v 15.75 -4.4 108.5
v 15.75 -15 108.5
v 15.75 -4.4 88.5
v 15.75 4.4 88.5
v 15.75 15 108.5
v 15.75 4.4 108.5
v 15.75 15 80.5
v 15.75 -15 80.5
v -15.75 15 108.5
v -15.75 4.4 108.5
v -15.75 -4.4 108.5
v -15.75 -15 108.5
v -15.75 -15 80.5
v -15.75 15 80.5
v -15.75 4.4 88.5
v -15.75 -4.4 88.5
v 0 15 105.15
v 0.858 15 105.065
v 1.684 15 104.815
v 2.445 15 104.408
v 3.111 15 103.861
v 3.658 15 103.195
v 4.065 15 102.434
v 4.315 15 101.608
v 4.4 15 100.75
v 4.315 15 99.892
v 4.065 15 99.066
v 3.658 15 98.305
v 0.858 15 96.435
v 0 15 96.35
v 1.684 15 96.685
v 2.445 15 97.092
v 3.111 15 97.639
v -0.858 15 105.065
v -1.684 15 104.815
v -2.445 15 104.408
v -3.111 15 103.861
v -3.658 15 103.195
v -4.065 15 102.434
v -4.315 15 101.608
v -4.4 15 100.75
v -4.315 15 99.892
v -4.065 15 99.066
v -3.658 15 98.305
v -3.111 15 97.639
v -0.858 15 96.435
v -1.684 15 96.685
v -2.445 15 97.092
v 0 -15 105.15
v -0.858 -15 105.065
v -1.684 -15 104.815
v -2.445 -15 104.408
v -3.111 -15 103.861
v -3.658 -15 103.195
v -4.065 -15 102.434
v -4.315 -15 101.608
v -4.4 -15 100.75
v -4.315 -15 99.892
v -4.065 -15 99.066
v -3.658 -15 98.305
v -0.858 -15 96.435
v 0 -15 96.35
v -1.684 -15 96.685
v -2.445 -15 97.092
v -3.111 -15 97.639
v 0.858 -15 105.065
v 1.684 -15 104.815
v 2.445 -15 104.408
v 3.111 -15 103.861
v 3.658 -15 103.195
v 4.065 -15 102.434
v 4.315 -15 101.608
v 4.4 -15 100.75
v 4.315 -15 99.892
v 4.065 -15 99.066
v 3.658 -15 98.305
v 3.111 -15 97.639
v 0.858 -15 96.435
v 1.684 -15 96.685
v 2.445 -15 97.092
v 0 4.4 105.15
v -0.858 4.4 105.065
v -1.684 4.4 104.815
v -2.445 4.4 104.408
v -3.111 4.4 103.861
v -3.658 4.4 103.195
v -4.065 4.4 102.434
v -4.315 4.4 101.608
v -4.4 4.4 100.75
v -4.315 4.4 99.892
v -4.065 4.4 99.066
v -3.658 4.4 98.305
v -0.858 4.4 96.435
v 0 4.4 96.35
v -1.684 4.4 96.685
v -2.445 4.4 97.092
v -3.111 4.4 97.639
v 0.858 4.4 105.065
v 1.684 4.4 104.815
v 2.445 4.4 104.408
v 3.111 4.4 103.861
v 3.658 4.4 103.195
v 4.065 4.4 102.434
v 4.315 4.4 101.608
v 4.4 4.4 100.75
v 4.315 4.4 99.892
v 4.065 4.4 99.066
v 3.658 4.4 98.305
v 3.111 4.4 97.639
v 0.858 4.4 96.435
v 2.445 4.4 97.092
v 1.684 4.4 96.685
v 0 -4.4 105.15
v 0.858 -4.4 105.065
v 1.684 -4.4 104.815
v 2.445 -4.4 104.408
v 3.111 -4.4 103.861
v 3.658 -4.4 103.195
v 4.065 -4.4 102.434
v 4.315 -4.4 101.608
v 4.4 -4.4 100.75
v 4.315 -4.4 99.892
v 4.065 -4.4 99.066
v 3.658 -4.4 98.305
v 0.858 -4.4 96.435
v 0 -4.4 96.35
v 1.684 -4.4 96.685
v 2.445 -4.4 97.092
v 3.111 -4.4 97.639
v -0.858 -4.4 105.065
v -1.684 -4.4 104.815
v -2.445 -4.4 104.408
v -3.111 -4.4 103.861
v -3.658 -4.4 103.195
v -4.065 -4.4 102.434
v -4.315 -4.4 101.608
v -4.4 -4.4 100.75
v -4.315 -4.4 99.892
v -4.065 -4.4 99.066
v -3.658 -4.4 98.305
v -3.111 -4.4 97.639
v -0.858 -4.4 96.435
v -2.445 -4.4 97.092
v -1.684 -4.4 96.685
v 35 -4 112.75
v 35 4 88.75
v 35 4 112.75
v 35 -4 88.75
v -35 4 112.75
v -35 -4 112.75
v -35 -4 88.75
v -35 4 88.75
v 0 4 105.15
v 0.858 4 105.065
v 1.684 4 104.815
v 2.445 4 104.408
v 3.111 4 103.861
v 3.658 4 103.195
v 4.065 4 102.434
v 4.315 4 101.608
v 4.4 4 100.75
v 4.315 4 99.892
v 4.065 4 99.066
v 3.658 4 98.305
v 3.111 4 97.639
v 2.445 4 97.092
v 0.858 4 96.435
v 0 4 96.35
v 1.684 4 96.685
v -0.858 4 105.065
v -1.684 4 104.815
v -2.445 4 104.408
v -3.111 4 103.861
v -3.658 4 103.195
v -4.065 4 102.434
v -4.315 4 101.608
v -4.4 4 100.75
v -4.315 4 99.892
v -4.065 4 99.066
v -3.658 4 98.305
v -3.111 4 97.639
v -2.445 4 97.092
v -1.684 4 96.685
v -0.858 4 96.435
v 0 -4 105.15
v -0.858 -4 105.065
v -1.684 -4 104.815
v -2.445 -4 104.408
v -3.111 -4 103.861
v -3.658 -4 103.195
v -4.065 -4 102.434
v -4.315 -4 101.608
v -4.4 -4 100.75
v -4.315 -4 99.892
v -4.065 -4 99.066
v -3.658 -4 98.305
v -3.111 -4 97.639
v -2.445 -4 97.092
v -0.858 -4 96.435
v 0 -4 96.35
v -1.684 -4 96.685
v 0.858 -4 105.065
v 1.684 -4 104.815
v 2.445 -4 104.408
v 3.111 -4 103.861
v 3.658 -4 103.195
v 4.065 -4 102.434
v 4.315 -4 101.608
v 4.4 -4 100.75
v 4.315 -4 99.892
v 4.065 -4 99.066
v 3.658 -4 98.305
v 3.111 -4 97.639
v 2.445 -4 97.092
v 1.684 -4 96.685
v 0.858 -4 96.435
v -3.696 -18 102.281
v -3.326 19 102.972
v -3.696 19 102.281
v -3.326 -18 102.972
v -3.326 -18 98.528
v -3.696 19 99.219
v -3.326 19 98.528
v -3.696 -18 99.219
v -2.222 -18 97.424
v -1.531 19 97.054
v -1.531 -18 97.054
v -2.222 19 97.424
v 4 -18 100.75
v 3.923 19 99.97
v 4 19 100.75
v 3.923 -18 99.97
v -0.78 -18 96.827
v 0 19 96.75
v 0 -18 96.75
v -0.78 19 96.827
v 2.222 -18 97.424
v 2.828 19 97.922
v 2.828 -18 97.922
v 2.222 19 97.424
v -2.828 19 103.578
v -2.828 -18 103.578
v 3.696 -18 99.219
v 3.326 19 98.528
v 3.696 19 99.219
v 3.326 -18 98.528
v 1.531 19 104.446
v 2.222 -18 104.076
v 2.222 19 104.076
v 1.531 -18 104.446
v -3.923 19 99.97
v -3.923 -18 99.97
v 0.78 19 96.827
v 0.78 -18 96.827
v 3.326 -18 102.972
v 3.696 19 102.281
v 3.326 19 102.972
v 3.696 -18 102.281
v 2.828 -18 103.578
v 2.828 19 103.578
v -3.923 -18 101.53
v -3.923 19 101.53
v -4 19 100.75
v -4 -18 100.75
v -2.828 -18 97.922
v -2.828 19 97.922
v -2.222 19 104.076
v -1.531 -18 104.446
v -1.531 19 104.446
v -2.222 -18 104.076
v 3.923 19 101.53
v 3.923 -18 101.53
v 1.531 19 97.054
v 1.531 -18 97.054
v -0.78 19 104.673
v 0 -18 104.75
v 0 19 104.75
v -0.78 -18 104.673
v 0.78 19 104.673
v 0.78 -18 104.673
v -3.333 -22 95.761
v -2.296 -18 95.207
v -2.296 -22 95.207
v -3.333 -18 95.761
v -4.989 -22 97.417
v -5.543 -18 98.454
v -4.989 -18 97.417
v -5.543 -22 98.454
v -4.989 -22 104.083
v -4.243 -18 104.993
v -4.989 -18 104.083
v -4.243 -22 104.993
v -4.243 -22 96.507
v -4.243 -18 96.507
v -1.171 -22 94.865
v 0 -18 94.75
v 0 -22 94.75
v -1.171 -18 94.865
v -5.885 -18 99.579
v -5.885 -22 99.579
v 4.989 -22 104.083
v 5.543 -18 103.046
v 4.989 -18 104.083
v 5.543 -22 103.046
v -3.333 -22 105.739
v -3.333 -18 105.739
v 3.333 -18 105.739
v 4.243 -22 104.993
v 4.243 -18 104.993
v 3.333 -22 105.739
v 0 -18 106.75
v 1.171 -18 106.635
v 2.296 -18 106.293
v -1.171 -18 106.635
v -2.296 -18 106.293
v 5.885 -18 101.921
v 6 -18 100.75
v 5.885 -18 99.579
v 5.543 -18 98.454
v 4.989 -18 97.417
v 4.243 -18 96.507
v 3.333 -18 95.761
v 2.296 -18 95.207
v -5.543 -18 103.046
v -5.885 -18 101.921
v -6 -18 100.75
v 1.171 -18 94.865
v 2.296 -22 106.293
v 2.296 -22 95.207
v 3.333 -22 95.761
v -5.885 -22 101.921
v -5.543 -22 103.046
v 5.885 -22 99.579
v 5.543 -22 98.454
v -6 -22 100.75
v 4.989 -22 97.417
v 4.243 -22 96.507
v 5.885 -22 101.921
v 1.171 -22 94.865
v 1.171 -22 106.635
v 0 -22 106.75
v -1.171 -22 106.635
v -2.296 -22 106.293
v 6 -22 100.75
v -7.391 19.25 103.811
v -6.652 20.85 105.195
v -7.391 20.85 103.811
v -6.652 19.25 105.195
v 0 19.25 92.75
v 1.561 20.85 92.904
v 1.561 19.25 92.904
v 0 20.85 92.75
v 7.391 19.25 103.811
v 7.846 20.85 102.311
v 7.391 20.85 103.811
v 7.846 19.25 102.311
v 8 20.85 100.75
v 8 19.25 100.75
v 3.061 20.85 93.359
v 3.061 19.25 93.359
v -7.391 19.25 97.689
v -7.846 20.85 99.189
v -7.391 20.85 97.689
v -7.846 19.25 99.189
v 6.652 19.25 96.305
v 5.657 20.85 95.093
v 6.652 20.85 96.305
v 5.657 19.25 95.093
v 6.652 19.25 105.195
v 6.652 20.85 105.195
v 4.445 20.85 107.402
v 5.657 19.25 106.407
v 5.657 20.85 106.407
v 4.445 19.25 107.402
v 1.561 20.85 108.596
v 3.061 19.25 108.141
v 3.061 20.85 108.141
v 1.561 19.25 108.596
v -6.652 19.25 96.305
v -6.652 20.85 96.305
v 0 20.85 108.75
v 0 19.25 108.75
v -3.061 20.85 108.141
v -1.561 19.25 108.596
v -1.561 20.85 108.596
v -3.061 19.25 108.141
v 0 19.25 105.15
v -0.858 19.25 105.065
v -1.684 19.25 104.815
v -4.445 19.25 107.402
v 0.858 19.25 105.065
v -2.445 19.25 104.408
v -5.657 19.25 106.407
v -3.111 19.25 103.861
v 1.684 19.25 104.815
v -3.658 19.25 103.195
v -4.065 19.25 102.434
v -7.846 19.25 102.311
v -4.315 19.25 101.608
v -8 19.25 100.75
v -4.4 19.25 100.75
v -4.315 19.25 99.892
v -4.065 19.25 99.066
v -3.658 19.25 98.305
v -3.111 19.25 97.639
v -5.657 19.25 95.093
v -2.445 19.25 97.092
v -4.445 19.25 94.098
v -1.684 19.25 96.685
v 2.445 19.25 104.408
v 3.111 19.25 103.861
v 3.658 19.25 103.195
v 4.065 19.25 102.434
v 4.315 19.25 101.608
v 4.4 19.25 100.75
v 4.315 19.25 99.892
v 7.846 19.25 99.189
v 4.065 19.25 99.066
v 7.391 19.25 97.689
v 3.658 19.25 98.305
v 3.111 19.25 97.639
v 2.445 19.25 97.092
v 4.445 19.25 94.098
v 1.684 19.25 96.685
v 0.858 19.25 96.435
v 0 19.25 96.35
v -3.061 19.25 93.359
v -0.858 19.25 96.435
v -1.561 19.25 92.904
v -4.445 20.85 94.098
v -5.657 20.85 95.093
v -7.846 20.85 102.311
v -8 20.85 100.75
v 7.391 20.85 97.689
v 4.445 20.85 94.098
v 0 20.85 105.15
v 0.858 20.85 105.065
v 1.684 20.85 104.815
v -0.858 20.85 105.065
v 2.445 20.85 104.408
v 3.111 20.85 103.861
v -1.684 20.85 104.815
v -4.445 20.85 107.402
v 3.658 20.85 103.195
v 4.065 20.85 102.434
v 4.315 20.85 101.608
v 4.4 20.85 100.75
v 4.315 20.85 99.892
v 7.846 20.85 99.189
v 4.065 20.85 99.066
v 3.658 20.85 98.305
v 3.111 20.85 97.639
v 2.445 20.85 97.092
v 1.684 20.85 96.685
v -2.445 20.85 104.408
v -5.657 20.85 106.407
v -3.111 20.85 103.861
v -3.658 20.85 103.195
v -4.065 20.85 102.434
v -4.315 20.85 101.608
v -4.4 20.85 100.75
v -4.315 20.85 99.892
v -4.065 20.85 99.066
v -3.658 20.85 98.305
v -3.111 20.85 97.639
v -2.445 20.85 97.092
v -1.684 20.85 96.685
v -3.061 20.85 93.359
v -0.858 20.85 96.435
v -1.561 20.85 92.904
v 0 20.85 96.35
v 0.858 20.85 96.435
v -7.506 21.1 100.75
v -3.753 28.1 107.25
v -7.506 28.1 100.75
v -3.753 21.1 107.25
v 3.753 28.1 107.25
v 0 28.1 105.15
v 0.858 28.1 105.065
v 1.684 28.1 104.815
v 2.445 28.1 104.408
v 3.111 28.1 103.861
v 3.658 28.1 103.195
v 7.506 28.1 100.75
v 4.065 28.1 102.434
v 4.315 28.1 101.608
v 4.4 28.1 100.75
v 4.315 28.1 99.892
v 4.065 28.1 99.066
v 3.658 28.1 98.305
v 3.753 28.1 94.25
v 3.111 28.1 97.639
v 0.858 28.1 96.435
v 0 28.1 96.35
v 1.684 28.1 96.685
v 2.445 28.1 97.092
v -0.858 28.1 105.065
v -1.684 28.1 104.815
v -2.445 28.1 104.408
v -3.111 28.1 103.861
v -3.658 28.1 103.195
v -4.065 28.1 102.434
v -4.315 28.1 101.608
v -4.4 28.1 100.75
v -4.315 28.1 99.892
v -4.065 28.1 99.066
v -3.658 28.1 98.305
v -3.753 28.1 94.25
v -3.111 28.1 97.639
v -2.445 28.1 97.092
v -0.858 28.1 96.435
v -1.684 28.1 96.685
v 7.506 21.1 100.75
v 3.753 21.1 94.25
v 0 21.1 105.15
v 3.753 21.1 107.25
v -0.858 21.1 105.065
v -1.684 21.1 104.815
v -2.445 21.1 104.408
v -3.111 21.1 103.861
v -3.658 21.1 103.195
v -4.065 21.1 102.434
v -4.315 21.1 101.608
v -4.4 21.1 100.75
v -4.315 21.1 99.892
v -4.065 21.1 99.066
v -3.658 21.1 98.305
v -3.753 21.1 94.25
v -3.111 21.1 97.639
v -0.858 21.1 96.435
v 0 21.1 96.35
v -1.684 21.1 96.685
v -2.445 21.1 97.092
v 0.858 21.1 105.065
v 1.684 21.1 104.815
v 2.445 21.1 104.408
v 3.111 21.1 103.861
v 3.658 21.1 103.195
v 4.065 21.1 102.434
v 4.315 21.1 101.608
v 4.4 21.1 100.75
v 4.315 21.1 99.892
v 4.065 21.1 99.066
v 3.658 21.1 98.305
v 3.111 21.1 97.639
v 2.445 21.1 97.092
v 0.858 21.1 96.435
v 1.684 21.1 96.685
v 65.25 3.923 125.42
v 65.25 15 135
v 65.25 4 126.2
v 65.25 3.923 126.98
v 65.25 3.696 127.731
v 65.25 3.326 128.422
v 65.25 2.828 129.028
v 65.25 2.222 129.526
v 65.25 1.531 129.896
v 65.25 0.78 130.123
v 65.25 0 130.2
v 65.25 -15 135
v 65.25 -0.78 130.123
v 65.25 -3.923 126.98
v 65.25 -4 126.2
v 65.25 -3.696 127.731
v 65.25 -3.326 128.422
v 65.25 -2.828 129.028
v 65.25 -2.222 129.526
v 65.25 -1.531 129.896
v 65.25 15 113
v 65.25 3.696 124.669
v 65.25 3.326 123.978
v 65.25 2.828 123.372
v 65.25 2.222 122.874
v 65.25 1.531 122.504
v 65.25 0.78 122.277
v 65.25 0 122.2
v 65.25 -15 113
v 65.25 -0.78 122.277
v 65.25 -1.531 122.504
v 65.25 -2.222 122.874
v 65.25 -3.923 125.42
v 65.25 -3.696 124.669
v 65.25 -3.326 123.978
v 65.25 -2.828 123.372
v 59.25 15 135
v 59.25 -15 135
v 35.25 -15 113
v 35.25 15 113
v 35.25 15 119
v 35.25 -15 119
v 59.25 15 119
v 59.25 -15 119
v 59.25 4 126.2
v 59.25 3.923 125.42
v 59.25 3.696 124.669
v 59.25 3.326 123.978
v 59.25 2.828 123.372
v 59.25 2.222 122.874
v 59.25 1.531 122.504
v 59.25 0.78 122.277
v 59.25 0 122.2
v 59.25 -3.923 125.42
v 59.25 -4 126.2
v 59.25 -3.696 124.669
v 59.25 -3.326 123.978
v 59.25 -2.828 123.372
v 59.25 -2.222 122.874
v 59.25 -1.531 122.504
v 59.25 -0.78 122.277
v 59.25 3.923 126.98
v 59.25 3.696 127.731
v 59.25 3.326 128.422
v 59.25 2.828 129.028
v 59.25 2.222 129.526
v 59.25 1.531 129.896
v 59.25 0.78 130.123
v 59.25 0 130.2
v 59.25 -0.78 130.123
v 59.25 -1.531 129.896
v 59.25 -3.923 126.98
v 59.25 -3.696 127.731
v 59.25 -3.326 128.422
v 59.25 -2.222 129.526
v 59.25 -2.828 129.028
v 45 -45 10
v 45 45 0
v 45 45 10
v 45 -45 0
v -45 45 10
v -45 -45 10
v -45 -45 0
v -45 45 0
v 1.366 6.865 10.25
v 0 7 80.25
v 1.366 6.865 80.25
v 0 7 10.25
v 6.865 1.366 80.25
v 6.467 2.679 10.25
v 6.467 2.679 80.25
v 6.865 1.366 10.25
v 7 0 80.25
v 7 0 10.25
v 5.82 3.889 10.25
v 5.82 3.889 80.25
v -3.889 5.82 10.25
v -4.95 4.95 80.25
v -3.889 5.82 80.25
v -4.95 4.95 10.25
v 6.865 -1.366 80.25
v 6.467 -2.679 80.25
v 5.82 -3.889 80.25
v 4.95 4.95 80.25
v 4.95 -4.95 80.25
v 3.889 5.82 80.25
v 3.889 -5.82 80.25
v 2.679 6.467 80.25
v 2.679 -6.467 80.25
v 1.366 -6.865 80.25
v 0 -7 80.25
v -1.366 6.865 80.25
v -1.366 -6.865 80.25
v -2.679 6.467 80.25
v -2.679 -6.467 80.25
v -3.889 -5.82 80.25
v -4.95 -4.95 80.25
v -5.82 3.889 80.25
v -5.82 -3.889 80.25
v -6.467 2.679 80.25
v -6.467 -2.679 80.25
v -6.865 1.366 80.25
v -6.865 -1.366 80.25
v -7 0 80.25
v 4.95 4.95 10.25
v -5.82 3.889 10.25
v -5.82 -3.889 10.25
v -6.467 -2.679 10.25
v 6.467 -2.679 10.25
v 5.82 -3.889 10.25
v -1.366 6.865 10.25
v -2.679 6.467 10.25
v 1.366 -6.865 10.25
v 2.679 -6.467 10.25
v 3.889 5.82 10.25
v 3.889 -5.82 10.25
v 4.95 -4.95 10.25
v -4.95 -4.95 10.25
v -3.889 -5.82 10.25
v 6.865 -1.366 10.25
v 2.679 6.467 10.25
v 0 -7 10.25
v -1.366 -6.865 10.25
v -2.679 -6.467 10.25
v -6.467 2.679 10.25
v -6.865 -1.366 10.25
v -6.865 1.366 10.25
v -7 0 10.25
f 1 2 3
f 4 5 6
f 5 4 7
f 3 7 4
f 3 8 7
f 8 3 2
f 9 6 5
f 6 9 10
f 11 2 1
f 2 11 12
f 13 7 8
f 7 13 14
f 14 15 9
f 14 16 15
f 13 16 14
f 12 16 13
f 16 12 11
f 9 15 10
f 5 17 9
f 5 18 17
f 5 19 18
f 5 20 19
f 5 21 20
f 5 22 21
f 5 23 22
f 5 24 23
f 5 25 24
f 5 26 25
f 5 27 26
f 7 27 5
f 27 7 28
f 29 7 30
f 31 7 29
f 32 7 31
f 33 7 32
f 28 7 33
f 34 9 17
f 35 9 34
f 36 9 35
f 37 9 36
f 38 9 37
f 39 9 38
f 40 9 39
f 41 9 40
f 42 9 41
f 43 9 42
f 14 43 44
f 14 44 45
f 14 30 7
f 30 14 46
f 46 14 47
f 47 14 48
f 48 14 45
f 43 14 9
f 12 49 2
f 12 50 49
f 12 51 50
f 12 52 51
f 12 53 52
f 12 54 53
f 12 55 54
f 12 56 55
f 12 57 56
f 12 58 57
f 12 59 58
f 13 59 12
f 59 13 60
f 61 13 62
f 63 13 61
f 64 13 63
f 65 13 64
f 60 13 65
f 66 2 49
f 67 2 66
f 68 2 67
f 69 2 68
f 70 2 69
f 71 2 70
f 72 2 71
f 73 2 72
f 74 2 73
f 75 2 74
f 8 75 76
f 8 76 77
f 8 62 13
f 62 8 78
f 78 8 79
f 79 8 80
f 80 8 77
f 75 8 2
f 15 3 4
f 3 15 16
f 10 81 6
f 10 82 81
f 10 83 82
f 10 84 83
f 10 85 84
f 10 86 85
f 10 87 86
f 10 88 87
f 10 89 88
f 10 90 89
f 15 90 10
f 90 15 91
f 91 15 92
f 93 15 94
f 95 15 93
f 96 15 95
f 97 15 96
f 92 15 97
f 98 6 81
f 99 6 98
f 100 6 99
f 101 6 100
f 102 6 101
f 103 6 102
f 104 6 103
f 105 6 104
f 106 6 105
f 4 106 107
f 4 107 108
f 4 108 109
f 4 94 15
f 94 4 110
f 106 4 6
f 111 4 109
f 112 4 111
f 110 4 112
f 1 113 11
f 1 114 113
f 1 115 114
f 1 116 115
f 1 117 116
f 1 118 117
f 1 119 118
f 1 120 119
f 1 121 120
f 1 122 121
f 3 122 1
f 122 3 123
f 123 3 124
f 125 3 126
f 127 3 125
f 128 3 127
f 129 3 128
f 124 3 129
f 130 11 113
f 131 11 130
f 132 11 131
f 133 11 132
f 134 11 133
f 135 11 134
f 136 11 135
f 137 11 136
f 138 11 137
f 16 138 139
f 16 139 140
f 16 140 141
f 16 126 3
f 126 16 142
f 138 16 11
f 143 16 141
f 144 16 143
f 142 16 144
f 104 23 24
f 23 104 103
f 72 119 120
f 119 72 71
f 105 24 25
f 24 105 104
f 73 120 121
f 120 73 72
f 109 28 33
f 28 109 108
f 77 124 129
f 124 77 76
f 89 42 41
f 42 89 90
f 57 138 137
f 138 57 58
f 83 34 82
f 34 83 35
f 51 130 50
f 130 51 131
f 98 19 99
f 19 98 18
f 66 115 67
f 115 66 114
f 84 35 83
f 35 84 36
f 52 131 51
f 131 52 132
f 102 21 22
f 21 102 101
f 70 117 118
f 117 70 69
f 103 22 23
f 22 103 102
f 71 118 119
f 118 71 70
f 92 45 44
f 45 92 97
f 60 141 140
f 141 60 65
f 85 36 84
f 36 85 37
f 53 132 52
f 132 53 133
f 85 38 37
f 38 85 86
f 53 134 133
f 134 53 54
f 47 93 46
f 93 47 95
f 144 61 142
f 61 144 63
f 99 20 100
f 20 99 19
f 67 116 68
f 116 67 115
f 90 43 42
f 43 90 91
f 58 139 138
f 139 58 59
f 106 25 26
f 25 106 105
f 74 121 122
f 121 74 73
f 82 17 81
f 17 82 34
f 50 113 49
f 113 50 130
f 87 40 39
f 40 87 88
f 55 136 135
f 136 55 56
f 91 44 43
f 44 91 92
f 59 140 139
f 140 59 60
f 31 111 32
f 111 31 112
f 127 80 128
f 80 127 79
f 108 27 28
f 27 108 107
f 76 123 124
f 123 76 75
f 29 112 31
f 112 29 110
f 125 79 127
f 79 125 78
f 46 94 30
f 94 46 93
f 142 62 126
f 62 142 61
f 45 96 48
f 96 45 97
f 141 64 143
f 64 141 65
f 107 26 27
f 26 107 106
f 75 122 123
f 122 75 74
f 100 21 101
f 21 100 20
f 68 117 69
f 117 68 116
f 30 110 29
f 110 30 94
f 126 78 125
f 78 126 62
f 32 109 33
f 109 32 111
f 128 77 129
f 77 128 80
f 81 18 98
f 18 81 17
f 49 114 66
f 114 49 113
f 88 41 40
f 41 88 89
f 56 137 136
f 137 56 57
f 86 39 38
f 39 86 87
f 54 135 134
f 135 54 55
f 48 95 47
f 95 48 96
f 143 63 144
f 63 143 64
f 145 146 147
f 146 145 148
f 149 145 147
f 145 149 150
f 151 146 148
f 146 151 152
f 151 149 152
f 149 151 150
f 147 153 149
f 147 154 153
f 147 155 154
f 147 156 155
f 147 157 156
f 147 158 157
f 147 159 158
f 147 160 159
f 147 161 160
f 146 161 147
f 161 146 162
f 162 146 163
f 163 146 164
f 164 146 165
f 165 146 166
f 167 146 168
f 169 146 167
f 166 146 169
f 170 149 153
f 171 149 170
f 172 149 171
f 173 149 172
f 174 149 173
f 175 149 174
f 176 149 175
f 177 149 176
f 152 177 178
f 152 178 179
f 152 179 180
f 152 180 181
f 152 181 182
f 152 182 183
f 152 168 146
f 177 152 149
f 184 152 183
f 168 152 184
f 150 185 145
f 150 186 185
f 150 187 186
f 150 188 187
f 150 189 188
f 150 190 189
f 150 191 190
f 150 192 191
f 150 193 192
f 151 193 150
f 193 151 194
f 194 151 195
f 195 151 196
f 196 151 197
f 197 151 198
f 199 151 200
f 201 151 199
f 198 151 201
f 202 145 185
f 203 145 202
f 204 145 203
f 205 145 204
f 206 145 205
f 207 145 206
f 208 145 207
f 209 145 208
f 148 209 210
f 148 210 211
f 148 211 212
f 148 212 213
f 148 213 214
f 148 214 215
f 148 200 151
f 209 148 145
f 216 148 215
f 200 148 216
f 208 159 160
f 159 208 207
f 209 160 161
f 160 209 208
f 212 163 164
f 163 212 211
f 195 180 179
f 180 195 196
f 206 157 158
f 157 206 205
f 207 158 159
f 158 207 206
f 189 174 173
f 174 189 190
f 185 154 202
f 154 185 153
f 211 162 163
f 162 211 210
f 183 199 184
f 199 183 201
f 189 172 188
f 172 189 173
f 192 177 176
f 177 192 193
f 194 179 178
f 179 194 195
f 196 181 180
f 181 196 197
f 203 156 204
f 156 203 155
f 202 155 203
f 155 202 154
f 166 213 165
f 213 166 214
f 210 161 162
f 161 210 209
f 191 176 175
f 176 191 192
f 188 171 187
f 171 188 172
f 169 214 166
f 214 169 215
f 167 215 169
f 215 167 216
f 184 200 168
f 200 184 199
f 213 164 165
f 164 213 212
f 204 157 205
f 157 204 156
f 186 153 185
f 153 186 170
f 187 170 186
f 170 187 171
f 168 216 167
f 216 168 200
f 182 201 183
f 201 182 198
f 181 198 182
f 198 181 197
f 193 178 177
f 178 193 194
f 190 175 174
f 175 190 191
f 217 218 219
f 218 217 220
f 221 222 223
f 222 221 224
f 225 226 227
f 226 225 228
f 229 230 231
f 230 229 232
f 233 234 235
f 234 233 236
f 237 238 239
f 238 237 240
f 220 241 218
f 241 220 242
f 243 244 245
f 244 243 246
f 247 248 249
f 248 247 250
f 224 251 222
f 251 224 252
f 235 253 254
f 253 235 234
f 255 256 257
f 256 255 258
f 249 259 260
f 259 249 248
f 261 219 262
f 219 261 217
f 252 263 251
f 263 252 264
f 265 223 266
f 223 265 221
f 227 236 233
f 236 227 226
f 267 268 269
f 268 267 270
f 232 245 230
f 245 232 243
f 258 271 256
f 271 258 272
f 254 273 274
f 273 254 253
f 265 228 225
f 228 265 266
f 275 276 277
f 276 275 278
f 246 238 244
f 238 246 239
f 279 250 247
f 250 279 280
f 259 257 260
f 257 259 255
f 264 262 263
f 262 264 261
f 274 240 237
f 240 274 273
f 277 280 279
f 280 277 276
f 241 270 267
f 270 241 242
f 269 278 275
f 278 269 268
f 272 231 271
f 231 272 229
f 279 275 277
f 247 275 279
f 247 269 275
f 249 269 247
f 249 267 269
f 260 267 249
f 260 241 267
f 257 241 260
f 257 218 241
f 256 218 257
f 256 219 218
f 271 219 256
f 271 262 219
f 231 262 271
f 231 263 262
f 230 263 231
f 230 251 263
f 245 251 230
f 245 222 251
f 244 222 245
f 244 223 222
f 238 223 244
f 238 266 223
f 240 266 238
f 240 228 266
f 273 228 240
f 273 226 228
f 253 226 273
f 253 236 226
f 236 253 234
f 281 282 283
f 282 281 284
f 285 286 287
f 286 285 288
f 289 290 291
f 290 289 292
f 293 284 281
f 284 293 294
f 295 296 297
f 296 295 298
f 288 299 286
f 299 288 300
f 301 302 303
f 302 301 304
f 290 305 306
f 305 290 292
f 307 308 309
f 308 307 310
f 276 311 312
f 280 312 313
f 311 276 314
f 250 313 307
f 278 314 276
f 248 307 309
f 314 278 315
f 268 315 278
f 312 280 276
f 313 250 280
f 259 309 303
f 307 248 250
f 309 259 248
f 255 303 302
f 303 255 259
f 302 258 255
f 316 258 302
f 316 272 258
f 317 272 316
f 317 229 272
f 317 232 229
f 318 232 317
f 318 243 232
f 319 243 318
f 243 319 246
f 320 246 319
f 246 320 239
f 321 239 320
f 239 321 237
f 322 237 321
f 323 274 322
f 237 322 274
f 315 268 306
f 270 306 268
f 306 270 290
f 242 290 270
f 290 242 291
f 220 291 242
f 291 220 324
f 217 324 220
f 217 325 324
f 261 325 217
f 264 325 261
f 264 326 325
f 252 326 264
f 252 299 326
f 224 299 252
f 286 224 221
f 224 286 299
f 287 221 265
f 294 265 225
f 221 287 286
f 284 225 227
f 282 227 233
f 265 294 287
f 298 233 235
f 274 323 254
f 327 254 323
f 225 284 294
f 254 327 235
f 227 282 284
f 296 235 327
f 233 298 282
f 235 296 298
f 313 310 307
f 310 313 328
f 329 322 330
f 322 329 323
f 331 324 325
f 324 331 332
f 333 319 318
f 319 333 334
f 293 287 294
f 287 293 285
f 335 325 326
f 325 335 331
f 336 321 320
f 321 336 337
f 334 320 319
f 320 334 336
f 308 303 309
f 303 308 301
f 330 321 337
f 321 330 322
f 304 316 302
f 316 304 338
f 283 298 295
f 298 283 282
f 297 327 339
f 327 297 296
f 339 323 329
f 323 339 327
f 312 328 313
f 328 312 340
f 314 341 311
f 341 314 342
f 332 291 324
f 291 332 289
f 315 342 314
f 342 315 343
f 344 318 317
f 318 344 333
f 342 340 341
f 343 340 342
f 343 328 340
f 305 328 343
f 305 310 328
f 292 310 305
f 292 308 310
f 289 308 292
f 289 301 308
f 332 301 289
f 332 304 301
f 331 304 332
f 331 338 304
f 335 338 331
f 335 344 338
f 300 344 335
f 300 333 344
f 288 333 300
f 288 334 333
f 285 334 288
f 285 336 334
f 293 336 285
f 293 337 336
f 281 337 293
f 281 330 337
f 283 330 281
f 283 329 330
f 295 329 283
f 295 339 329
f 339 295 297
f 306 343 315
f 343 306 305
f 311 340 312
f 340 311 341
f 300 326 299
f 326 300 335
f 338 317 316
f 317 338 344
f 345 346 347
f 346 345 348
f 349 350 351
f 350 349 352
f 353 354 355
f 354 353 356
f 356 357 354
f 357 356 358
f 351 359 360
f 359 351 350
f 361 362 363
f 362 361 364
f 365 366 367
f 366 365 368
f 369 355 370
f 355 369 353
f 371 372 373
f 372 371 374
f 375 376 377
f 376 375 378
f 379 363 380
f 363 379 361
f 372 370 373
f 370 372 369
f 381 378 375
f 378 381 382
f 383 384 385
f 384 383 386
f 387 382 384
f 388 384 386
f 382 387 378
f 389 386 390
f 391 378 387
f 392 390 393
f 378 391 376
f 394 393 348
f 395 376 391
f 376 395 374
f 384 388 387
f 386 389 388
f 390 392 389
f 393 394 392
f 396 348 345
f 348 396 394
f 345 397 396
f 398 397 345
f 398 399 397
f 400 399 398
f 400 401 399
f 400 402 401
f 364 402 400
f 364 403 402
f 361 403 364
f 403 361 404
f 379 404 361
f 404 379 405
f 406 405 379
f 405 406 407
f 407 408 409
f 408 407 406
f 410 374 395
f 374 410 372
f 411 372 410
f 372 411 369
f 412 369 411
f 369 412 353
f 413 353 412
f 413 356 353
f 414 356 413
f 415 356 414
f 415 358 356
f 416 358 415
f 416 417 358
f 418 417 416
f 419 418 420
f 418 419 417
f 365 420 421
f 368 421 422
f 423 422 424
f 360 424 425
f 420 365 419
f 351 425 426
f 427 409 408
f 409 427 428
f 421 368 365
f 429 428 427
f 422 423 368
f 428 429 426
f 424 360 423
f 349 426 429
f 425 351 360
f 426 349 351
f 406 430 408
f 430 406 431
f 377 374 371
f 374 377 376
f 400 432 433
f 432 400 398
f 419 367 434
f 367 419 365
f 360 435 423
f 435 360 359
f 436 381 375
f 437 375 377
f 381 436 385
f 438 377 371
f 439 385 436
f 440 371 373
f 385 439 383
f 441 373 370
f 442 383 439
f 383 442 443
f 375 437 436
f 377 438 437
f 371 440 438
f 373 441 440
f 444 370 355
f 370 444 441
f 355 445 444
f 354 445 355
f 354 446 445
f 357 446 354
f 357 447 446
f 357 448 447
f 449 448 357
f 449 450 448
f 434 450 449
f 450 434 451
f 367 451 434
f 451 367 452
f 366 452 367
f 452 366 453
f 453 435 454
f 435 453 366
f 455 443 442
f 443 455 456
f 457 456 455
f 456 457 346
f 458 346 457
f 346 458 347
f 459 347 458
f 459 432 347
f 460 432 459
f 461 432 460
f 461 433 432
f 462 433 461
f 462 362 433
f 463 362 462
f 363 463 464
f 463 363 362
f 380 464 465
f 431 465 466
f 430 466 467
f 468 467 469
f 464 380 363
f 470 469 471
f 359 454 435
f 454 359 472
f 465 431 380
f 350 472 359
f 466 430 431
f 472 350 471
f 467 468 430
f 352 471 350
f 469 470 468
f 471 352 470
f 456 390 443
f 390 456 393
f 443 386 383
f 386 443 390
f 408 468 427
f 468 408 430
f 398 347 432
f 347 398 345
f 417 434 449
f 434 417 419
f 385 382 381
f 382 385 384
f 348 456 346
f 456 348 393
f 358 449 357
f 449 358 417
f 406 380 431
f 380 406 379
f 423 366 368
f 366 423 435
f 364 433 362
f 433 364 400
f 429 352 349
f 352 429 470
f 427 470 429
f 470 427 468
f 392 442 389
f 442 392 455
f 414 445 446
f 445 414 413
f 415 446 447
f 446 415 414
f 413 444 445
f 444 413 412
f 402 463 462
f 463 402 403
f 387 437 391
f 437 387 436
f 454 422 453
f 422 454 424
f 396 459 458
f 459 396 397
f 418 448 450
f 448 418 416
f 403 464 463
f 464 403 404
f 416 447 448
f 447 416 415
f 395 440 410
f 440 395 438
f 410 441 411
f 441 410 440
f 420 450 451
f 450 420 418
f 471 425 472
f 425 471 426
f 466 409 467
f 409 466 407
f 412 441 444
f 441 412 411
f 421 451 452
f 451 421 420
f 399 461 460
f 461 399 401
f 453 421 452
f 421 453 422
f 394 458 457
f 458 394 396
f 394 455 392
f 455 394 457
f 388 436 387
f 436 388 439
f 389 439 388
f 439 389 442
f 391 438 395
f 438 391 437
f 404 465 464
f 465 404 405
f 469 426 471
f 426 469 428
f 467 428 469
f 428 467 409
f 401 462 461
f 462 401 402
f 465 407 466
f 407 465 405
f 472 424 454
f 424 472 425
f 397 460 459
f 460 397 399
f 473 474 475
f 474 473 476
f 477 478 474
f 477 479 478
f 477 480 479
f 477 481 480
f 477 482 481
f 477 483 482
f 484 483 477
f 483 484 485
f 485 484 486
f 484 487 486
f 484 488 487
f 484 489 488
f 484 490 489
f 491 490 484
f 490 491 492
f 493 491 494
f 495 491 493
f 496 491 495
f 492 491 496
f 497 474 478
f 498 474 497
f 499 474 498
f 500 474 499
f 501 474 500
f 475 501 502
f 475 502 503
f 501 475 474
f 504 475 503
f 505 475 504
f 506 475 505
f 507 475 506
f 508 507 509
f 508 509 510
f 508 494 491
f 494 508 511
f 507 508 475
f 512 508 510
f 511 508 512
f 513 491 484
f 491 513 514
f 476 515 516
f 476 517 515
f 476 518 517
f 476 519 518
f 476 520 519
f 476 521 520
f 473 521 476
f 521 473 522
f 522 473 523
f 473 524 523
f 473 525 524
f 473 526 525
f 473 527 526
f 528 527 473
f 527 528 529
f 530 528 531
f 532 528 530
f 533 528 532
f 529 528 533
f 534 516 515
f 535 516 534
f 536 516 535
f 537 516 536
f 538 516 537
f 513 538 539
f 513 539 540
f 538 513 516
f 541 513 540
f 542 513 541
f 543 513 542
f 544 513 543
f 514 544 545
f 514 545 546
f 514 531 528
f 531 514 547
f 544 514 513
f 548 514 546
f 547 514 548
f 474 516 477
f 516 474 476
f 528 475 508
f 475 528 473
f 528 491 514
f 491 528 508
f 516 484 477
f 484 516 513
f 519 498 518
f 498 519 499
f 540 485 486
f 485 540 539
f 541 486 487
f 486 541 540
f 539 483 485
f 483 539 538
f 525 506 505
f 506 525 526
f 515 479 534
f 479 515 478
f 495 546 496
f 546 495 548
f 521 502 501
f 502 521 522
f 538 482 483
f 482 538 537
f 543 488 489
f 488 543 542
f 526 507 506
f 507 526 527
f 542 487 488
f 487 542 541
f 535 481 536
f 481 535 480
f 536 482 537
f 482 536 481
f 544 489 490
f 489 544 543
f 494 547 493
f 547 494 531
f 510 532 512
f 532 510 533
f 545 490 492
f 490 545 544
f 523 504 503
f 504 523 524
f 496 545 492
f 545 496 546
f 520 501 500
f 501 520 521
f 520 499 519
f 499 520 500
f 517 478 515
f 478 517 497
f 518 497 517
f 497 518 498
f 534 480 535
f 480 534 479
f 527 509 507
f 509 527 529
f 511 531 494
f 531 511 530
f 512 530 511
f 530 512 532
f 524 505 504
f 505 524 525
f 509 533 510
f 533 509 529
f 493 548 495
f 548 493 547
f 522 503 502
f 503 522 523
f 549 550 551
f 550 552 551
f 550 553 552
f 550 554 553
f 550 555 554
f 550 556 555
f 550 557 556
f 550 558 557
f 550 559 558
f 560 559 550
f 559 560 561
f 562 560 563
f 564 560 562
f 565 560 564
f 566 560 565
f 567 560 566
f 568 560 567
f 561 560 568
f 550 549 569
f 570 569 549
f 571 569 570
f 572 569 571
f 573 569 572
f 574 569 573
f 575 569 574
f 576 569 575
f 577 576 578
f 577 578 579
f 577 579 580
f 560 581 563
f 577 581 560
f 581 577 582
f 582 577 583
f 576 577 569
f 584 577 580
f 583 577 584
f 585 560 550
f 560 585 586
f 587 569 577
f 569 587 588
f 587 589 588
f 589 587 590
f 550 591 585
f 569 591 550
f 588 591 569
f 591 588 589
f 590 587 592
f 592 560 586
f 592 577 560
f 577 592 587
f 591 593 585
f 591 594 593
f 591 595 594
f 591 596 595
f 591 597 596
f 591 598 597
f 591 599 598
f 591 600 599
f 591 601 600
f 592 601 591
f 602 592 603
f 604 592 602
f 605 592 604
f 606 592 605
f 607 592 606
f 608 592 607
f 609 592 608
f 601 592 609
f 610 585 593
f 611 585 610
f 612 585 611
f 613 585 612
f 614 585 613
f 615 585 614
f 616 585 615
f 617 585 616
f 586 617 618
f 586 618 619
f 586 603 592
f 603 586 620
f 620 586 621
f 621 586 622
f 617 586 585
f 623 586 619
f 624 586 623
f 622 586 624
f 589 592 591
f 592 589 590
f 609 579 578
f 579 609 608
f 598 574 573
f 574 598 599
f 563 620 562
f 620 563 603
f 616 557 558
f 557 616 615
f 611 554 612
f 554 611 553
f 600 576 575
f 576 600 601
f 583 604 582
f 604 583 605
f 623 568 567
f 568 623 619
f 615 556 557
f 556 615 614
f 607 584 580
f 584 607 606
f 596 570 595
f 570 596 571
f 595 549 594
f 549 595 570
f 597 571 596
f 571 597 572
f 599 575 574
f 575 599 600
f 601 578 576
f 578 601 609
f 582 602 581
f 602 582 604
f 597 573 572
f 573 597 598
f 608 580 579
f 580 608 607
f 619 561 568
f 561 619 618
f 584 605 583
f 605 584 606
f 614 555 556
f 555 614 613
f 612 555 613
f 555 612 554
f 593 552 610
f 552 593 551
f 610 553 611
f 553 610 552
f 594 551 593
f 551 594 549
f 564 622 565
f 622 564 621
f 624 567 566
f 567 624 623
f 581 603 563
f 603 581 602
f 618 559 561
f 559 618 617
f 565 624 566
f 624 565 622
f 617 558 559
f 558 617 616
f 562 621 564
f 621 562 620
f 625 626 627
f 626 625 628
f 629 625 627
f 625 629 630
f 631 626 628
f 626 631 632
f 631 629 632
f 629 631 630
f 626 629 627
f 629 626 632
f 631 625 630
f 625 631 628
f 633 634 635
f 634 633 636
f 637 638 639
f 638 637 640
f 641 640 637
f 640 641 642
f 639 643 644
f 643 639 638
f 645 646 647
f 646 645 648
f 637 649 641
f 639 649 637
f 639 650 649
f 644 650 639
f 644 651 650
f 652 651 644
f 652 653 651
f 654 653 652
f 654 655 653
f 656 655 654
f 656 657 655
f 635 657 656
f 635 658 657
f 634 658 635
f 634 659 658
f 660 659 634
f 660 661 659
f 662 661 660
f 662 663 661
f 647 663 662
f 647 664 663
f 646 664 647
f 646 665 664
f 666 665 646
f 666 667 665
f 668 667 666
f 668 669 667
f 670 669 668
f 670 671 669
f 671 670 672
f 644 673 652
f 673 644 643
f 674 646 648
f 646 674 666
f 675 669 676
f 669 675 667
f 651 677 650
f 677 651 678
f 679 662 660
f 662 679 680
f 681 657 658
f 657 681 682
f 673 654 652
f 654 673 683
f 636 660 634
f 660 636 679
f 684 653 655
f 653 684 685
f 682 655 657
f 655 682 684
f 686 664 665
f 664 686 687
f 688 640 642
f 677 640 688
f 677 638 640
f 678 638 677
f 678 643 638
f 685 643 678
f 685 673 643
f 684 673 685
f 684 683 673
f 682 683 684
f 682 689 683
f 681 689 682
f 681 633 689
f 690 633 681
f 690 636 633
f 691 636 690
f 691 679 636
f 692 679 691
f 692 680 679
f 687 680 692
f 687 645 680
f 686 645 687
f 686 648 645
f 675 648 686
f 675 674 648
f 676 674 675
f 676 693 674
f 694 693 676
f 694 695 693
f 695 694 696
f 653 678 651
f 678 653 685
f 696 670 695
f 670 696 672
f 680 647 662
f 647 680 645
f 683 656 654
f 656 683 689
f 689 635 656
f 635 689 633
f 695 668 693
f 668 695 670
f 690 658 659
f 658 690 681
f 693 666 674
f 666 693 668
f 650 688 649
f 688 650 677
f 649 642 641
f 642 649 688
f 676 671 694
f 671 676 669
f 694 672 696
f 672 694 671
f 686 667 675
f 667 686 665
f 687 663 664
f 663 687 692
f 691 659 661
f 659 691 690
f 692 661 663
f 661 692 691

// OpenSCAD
$fn = 32;

// ------------------------------------------------------------------------
// Lamp arm: column d14 x 70 mm, arm 70 mm
// Every part is its own module, assembly() places every instance.
// ------------------------------------------------------------------------

// --- part 1 ---
module lamp_base() {
  difference() {
    translate([-45, -45, 0]) cube([90, 90, 10]);
  }
}

// --- part 2 ---
module lamp_column() {
  cylinder(h = 70, d = 14);
}

// --- part 3 ---
module head_fork() {
  difference() {
    translate([-15.75, -15, 0]) cube([31.5, 30, 28]);
    translate([-16.75, -4.4, 8]) cube([33.5, 8.8, 21]);
    translate([0, 0, 20.25]) rotate([90, 0, 0]) cylinder(h = 32, d = 8.8, center = true);
  }
}

// --- part 4 ---
module lamp_arm() {
  difference() {
    translate([-35, -4, 0]) cube([70, 8, 24]);
    translate([0, 0, 12]) rotate([90, 0, 0]) cylinder(h = 10, d = 8.8, center = true);
  }
}

// --- part 5 ---
module arm_pin() {
  rotate([0, 90, 0]) cylinder(h = 38, d = 8, center = true);
  translate([-22, 0, 0]) rotate([0, 90, 0]) cylinder(h = 4, d = 12);
}

// --- part 6 ---
module arm_washer() {
  difference() {
      translate([0, 0, 0]) cylinder(h = 1.6, d = 16);
      translate([0, 0, -1]) cylinder(h = 3.6, d = 8.8);
    }
}

// --- part 7 ---
module arm_nut() {
  difference() {
    linear_extrude(height = 7) polygon(points = [[7.506, 0], [3.753, 6.5], [-3.753, 6.5], [-7.506, 0], [-3.753, -6.5], [3.753, -6.5]]);
    translate([0, 0, -1]) cylinder(h = 9, d = 8.8);
  }
}

// --- part 8 ---
module shade_bracket() {
  difference() {
    translate([-15, -15, 0]) cube([30, 30, 22]);
    translate([-16, -16, 6]) cube([25, 32, 17]);
    translate([12, 0, 13.2]) rotate([0, 90, 0]) cylinder(h = 8, d = 8, center = true);
  }
}

// --- assembly ---
module assembly() {
  color([0.80, 0.24, 0.20]) translate([0, 0, 0]) rotate([0, 0, 0]) lamp_base();
  color([0.20, 0.45, 0.75]) translate([0, 0, 10.25]) rotate([0, 0, 0]) lamp_column();
  color([0.25, 0.62, 0.32]) translate([0, 0, 80.5]) rotate([0, 0, 0]) head_fork();
  color([0.92, 0.70, 0.18]) translate([0, 0, 88.75]) rotate([0, 0, 0]) lamp_arm();
  color([0.58, 0.35, 0.70]) translate([0, 0, 100.75]) rotate([0, 0, 90]) arm_pin();
  color([0.16, 0.66, 0.66]) translate([0, 20.85, 100.75]) rotate([90, 0, 0]) arm_washer();
  color([0.85, 0.48, 0.18]) translate([0, 28.1, 100.75]) rotate([90, 0, 0]) arm_nut();
  color([0.55, 0.60, 0.65]) translate([50.25, 0, 113]) rotate([0, 0, 0]) shade_bracket();
}

assembly();
